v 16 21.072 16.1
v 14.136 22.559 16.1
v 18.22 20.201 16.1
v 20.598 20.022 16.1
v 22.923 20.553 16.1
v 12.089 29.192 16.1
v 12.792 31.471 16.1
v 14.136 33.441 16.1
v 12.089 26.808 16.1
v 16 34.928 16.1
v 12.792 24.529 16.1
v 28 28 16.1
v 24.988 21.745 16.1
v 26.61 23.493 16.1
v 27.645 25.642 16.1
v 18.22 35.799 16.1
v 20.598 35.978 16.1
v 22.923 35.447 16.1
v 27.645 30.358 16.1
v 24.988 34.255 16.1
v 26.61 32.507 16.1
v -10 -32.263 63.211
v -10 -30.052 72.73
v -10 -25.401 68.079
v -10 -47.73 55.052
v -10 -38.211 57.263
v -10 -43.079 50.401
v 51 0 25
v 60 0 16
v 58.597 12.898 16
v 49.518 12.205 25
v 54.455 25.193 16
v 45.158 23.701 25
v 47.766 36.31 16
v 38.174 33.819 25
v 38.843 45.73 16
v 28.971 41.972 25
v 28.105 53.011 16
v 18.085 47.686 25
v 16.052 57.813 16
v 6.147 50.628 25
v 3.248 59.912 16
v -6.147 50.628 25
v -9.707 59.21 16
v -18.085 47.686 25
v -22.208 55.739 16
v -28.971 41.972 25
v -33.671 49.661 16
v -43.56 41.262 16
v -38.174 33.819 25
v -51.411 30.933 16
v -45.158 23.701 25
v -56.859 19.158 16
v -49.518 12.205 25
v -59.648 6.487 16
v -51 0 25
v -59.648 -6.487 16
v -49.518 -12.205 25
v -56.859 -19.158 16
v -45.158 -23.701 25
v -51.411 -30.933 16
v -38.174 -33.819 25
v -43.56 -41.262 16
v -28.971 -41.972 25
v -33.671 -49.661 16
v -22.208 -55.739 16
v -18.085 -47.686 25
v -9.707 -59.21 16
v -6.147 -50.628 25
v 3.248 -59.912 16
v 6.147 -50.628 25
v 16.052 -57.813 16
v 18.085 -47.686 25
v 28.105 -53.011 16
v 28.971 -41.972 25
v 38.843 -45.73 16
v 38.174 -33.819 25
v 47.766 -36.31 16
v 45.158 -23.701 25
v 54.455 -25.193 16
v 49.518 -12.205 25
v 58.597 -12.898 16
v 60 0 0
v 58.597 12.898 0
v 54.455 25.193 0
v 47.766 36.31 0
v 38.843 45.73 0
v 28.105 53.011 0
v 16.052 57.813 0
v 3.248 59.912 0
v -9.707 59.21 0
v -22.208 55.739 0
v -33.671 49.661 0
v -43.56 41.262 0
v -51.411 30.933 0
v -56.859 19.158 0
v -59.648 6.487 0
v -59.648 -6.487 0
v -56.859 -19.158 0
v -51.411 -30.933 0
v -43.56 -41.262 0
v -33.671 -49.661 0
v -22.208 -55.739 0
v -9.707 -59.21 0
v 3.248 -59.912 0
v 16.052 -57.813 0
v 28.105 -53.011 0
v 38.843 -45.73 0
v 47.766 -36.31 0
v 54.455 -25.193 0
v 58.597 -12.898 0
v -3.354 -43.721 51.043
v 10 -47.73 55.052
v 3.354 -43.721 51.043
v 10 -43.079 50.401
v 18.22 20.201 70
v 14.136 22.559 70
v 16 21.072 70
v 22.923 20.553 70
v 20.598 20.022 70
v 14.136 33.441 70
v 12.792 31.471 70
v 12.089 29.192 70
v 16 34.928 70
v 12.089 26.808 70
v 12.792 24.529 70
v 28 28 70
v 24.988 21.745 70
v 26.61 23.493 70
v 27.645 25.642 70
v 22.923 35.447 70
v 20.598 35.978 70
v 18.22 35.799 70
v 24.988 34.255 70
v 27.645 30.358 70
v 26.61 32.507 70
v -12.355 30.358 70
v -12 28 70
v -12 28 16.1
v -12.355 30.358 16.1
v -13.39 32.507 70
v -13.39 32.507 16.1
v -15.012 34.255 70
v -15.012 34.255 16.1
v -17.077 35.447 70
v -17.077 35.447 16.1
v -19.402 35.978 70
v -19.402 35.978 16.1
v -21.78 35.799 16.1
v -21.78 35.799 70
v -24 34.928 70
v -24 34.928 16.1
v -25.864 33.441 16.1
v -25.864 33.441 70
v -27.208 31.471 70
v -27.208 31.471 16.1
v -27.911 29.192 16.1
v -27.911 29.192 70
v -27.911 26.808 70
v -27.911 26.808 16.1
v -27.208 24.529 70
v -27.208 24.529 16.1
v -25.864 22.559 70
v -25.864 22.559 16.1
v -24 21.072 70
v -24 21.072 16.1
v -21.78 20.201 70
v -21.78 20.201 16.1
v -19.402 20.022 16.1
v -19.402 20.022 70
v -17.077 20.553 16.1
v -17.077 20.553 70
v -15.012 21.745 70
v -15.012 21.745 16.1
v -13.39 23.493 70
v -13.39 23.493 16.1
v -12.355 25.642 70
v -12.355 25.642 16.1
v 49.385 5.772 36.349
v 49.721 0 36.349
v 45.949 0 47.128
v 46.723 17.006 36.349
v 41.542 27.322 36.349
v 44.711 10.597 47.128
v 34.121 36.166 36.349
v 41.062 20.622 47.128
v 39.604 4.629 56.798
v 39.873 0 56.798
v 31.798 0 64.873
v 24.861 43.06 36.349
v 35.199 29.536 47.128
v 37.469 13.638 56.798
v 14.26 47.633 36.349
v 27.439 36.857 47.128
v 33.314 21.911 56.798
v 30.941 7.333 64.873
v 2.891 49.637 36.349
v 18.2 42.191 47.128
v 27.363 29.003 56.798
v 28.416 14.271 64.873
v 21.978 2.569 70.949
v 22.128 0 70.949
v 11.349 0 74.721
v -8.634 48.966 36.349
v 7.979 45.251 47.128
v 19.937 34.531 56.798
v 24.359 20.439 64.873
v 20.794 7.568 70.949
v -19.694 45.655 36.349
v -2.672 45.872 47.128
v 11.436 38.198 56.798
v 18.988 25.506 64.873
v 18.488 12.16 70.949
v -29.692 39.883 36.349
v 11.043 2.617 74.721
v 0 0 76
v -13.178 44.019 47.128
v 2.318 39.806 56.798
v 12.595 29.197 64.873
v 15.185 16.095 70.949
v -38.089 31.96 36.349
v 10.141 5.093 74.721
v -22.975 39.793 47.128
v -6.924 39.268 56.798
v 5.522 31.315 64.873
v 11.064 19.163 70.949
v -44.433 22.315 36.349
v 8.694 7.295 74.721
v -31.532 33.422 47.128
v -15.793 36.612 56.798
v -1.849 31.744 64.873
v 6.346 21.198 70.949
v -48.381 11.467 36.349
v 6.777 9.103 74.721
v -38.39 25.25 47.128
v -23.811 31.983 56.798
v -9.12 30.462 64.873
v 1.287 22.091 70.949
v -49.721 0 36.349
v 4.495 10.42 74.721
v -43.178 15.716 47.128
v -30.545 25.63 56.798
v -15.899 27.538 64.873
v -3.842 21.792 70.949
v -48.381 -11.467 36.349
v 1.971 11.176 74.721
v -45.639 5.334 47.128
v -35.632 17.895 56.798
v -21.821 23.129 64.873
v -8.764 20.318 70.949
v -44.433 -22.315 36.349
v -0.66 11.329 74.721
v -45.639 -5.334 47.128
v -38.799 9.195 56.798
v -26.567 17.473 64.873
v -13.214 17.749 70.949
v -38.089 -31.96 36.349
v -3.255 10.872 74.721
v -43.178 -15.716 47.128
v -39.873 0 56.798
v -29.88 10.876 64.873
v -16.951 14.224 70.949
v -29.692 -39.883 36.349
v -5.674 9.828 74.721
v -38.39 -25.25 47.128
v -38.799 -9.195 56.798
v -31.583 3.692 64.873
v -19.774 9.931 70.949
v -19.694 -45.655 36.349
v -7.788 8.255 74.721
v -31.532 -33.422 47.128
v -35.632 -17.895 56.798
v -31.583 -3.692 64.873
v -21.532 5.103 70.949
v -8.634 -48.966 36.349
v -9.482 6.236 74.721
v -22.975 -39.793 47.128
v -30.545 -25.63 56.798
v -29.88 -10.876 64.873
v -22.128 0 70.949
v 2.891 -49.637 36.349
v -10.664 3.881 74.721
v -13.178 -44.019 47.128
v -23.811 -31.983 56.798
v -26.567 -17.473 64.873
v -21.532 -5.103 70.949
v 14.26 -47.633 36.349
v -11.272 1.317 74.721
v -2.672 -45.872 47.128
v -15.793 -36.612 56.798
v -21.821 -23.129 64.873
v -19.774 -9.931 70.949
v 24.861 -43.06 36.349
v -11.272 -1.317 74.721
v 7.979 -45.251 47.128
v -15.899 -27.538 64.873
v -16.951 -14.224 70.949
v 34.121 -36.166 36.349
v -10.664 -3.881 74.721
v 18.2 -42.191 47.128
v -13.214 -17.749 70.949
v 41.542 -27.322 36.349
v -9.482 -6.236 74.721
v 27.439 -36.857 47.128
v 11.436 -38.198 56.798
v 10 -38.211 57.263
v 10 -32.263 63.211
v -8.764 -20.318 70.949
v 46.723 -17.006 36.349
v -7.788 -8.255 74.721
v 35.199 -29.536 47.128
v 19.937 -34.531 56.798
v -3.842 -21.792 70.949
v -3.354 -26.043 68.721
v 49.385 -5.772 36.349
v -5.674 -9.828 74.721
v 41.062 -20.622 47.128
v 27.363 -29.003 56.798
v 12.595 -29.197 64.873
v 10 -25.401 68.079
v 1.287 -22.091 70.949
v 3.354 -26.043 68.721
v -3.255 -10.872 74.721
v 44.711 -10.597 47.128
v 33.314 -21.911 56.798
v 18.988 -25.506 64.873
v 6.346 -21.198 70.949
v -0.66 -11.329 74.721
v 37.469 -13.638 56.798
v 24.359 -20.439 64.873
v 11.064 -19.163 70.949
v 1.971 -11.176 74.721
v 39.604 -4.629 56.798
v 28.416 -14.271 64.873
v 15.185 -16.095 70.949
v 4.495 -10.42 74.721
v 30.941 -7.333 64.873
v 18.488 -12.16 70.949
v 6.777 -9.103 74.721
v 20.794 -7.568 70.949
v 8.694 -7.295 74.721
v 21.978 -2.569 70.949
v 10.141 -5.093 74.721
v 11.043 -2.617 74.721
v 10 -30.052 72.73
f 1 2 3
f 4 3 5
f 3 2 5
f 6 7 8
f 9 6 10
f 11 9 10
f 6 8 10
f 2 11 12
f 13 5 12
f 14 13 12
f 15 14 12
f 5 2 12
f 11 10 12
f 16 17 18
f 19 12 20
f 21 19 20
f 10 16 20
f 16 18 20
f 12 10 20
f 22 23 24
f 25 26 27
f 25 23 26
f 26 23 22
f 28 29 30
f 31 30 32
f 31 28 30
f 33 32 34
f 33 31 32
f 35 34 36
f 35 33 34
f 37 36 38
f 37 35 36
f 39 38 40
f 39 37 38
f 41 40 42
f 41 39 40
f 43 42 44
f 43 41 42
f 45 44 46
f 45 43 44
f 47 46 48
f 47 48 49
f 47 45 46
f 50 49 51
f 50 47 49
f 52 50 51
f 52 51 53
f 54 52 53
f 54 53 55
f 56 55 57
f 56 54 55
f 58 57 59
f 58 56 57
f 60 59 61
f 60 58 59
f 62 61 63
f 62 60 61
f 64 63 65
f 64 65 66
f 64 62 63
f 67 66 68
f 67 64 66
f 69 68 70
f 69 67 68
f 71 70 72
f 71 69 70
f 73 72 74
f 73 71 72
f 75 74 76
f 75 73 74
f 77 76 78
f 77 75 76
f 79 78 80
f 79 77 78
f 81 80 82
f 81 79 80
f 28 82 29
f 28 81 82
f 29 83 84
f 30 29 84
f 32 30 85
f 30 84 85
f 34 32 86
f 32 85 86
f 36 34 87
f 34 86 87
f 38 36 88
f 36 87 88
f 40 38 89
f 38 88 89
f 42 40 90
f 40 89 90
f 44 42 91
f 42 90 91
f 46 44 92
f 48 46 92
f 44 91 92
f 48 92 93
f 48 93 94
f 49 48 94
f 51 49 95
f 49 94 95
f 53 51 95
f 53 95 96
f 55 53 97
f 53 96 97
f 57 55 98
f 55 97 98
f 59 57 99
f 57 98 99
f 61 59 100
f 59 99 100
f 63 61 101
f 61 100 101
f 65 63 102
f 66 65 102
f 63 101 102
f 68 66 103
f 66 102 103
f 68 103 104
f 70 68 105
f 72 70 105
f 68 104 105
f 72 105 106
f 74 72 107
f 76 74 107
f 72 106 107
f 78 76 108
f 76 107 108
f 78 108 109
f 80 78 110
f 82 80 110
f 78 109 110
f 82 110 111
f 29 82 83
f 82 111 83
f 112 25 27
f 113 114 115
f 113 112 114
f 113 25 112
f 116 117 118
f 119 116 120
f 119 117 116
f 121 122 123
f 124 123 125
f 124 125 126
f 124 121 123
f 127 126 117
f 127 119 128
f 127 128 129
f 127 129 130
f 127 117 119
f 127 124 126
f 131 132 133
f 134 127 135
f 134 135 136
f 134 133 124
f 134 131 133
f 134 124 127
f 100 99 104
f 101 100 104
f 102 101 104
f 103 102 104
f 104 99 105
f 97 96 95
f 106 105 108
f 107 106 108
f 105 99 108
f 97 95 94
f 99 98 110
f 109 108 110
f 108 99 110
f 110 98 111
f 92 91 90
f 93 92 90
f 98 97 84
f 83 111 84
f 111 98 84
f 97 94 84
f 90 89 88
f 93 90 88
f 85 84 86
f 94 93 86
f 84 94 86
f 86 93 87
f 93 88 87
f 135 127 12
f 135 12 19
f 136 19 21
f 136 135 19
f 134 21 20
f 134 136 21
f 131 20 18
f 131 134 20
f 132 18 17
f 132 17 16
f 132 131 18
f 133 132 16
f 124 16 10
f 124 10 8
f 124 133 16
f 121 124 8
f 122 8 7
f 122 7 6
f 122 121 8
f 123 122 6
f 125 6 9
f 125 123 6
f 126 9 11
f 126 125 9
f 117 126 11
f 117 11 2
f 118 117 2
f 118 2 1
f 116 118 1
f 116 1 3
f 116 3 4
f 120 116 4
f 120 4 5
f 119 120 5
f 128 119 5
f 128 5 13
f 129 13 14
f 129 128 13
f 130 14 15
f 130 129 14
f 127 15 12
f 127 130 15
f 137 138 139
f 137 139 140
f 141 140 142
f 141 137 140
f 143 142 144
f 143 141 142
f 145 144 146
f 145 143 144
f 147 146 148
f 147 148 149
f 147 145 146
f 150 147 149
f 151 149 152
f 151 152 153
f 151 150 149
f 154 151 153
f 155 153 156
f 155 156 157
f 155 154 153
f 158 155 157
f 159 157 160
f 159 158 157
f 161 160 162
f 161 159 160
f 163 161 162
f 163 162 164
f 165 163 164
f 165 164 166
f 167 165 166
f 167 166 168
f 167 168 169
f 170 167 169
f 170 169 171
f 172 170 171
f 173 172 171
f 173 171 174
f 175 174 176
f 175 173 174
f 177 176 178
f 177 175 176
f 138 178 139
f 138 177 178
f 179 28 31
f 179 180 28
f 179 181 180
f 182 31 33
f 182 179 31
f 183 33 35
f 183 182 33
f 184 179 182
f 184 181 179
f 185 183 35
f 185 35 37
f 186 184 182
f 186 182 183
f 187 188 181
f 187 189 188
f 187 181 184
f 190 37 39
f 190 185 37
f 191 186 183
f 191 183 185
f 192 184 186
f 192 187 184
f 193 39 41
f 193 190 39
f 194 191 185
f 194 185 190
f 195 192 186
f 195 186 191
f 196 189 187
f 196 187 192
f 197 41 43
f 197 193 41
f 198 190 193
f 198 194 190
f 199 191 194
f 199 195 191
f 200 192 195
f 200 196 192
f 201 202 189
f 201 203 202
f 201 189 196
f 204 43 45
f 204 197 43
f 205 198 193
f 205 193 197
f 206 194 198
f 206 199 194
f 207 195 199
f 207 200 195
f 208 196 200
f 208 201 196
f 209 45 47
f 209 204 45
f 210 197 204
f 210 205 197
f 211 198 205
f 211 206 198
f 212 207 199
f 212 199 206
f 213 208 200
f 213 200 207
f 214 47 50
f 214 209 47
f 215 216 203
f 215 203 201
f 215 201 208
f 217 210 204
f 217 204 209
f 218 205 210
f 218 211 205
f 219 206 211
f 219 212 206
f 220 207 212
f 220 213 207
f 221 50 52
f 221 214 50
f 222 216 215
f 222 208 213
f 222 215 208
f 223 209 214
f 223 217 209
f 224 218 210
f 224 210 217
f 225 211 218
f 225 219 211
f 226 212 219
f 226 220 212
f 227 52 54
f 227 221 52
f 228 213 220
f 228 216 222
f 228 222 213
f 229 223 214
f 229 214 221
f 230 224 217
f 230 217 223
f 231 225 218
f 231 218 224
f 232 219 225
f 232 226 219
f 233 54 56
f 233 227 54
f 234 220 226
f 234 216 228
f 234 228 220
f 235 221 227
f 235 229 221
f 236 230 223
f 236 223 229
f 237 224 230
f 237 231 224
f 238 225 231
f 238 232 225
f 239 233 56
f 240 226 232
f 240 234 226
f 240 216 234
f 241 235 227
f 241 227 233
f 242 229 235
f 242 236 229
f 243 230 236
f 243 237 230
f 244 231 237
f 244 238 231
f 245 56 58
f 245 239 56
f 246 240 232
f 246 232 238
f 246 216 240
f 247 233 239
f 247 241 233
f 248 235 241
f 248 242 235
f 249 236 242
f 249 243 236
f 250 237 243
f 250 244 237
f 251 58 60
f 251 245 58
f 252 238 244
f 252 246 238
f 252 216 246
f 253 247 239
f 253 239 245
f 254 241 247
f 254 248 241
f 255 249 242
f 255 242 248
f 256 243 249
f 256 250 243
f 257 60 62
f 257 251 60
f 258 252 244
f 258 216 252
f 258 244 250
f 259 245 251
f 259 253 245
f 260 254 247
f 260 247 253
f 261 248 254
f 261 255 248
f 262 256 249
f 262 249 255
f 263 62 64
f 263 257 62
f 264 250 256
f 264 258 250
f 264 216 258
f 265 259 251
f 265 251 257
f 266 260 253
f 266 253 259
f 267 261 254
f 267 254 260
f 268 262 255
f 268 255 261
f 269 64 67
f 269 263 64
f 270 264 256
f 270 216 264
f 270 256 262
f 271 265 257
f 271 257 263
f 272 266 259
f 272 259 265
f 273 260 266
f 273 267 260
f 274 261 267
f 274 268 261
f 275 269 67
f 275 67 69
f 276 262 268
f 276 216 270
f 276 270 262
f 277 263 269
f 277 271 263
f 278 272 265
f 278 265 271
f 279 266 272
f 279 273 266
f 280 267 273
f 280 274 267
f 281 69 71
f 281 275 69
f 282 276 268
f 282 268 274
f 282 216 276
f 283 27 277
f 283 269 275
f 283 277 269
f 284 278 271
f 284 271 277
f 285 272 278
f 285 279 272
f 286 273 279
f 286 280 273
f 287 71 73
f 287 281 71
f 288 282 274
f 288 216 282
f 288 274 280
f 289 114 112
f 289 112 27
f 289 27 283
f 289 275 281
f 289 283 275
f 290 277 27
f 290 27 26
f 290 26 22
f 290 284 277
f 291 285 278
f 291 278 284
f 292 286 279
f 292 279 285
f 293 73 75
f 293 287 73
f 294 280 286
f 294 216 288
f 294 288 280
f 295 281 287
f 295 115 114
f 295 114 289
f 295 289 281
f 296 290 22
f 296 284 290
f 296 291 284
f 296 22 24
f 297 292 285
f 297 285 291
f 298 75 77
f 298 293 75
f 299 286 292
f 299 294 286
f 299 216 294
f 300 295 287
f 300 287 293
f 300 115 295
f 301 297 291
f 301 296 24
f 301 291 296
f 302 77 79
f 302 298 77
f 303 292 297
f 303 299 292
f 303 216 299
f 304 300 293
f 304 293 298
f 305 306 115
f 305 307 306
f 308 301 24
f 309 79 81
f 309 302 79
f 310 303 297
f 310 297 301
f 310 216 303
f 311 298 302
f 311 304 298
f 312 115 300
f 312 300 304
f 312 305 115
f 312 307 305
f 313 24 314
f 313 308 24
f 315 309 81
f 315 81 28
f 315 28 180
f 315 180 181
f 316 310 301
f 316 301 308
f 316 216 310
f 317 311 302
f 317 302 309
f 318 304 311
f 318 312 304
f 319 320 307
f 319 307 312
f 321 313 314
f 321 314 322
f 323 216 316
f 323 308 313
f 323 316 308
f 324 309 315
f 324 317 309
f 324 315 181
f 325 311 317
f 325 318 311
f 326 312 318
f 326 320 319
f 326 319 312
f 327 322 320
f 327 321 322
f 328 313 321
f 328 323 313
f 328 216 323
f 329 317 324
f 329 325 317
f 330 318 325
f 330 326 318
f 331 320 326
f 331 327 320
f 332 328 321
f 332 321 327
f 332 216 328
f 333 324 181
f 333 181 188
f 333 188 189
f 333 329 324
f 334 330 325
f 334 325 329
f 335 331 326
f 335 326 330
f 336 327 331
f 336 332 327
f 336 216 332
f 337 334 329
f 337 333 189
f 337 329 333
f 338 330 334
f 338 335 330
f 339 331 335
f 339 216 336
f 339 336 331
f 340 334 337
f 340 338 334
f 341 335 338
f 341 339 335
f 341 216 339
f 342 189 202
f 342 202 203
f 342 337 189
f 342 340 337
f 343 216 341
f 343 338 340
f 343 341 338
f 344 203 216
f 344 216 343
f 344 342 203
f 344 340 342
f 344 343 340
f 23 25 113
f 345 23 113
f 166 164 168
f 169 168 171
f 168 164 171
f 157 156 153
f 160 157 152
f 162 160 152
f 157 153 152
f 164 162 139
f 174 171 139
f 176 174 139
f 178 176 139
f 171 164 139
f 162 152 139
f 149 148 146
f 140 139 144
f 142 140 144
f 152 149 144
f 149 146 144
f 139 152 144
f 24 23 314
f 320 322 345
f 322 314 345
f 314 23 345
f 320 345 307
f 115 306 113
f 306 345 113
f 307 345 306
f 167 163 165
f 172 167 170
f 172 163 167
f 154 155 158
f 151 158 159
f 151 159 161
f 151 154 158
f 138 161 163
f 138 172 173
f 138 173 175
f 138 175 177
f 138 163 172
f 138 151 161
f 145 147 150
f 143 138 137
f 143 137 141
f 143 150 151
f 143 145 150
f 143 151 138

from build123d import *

# Parameters (mm, degrees)
F0_R      = 60
F1_DEPTH  = 25
F2_SIZE   = 9
F6_R      = 8
F7_DEPTH  = 53.9
F12_W     = 20
F12_H     = 25
F13_DEPTH = 35


with BuildPart() as f1:
    # F0 (on Top) → F1 (new body)
    with BuildSketch(Plane.XY):
        Circle(F0_R)
    extrude(amount=F1_DEPTH)

    # F2
    f2_edges = [f1.edges().sort_by_distance(p)[0] for p in [
        (-60, 0, 25),
    ]]
    chamfer(f2_edges, length=F2_SIZE)

    # F3 (on Front) → F4 (revolve)
    with BuildSketch(Plane.XZ):
        with BuildLine():
            Line((0, 25), (51, 25))
            ThreePointArc((51, 25), (36.0624458405, 61.0624458405), (0, 76))
            Line((0, 76), (0, 25))
        make_face()
    revolve(axis=Axis((0, 0, 50.5), (0, 0, 1)))

    # F12 (on face) → F13 (join)
    with BuildSketch(Plane(origin=(0, -51.3908729653, 51.3908729653), x_dir=(1, 0, 0), z_dir=(0, 0.7071067812, -0.7071067812))):
        with Locations((0, -17.6776695297)):
            Rectangle(F12_W, F12_H)
    extrude(amount=F13_DEPTH)


with BuildPart() as f7:
    # F6 (on offset) → F7 (new body)
    with BuildSketch(Plane.XY.offset(70)):
        with Locations((-20, 28)):
            Circle(F6_R)
    extrude(amount=-F7_DEPTH)


with BuildPart() as f7b:
    # F6 (on offset) → F7, piece 2 (new body)
    with BuildSketch(Plane.XY.offset(70)):
        with Locations((20, 28)):
            Circle(F6_R)
    extrude(amount=-F7_DEPTH)


solid = Compound([f1.part, f7.part, f7b.part])
